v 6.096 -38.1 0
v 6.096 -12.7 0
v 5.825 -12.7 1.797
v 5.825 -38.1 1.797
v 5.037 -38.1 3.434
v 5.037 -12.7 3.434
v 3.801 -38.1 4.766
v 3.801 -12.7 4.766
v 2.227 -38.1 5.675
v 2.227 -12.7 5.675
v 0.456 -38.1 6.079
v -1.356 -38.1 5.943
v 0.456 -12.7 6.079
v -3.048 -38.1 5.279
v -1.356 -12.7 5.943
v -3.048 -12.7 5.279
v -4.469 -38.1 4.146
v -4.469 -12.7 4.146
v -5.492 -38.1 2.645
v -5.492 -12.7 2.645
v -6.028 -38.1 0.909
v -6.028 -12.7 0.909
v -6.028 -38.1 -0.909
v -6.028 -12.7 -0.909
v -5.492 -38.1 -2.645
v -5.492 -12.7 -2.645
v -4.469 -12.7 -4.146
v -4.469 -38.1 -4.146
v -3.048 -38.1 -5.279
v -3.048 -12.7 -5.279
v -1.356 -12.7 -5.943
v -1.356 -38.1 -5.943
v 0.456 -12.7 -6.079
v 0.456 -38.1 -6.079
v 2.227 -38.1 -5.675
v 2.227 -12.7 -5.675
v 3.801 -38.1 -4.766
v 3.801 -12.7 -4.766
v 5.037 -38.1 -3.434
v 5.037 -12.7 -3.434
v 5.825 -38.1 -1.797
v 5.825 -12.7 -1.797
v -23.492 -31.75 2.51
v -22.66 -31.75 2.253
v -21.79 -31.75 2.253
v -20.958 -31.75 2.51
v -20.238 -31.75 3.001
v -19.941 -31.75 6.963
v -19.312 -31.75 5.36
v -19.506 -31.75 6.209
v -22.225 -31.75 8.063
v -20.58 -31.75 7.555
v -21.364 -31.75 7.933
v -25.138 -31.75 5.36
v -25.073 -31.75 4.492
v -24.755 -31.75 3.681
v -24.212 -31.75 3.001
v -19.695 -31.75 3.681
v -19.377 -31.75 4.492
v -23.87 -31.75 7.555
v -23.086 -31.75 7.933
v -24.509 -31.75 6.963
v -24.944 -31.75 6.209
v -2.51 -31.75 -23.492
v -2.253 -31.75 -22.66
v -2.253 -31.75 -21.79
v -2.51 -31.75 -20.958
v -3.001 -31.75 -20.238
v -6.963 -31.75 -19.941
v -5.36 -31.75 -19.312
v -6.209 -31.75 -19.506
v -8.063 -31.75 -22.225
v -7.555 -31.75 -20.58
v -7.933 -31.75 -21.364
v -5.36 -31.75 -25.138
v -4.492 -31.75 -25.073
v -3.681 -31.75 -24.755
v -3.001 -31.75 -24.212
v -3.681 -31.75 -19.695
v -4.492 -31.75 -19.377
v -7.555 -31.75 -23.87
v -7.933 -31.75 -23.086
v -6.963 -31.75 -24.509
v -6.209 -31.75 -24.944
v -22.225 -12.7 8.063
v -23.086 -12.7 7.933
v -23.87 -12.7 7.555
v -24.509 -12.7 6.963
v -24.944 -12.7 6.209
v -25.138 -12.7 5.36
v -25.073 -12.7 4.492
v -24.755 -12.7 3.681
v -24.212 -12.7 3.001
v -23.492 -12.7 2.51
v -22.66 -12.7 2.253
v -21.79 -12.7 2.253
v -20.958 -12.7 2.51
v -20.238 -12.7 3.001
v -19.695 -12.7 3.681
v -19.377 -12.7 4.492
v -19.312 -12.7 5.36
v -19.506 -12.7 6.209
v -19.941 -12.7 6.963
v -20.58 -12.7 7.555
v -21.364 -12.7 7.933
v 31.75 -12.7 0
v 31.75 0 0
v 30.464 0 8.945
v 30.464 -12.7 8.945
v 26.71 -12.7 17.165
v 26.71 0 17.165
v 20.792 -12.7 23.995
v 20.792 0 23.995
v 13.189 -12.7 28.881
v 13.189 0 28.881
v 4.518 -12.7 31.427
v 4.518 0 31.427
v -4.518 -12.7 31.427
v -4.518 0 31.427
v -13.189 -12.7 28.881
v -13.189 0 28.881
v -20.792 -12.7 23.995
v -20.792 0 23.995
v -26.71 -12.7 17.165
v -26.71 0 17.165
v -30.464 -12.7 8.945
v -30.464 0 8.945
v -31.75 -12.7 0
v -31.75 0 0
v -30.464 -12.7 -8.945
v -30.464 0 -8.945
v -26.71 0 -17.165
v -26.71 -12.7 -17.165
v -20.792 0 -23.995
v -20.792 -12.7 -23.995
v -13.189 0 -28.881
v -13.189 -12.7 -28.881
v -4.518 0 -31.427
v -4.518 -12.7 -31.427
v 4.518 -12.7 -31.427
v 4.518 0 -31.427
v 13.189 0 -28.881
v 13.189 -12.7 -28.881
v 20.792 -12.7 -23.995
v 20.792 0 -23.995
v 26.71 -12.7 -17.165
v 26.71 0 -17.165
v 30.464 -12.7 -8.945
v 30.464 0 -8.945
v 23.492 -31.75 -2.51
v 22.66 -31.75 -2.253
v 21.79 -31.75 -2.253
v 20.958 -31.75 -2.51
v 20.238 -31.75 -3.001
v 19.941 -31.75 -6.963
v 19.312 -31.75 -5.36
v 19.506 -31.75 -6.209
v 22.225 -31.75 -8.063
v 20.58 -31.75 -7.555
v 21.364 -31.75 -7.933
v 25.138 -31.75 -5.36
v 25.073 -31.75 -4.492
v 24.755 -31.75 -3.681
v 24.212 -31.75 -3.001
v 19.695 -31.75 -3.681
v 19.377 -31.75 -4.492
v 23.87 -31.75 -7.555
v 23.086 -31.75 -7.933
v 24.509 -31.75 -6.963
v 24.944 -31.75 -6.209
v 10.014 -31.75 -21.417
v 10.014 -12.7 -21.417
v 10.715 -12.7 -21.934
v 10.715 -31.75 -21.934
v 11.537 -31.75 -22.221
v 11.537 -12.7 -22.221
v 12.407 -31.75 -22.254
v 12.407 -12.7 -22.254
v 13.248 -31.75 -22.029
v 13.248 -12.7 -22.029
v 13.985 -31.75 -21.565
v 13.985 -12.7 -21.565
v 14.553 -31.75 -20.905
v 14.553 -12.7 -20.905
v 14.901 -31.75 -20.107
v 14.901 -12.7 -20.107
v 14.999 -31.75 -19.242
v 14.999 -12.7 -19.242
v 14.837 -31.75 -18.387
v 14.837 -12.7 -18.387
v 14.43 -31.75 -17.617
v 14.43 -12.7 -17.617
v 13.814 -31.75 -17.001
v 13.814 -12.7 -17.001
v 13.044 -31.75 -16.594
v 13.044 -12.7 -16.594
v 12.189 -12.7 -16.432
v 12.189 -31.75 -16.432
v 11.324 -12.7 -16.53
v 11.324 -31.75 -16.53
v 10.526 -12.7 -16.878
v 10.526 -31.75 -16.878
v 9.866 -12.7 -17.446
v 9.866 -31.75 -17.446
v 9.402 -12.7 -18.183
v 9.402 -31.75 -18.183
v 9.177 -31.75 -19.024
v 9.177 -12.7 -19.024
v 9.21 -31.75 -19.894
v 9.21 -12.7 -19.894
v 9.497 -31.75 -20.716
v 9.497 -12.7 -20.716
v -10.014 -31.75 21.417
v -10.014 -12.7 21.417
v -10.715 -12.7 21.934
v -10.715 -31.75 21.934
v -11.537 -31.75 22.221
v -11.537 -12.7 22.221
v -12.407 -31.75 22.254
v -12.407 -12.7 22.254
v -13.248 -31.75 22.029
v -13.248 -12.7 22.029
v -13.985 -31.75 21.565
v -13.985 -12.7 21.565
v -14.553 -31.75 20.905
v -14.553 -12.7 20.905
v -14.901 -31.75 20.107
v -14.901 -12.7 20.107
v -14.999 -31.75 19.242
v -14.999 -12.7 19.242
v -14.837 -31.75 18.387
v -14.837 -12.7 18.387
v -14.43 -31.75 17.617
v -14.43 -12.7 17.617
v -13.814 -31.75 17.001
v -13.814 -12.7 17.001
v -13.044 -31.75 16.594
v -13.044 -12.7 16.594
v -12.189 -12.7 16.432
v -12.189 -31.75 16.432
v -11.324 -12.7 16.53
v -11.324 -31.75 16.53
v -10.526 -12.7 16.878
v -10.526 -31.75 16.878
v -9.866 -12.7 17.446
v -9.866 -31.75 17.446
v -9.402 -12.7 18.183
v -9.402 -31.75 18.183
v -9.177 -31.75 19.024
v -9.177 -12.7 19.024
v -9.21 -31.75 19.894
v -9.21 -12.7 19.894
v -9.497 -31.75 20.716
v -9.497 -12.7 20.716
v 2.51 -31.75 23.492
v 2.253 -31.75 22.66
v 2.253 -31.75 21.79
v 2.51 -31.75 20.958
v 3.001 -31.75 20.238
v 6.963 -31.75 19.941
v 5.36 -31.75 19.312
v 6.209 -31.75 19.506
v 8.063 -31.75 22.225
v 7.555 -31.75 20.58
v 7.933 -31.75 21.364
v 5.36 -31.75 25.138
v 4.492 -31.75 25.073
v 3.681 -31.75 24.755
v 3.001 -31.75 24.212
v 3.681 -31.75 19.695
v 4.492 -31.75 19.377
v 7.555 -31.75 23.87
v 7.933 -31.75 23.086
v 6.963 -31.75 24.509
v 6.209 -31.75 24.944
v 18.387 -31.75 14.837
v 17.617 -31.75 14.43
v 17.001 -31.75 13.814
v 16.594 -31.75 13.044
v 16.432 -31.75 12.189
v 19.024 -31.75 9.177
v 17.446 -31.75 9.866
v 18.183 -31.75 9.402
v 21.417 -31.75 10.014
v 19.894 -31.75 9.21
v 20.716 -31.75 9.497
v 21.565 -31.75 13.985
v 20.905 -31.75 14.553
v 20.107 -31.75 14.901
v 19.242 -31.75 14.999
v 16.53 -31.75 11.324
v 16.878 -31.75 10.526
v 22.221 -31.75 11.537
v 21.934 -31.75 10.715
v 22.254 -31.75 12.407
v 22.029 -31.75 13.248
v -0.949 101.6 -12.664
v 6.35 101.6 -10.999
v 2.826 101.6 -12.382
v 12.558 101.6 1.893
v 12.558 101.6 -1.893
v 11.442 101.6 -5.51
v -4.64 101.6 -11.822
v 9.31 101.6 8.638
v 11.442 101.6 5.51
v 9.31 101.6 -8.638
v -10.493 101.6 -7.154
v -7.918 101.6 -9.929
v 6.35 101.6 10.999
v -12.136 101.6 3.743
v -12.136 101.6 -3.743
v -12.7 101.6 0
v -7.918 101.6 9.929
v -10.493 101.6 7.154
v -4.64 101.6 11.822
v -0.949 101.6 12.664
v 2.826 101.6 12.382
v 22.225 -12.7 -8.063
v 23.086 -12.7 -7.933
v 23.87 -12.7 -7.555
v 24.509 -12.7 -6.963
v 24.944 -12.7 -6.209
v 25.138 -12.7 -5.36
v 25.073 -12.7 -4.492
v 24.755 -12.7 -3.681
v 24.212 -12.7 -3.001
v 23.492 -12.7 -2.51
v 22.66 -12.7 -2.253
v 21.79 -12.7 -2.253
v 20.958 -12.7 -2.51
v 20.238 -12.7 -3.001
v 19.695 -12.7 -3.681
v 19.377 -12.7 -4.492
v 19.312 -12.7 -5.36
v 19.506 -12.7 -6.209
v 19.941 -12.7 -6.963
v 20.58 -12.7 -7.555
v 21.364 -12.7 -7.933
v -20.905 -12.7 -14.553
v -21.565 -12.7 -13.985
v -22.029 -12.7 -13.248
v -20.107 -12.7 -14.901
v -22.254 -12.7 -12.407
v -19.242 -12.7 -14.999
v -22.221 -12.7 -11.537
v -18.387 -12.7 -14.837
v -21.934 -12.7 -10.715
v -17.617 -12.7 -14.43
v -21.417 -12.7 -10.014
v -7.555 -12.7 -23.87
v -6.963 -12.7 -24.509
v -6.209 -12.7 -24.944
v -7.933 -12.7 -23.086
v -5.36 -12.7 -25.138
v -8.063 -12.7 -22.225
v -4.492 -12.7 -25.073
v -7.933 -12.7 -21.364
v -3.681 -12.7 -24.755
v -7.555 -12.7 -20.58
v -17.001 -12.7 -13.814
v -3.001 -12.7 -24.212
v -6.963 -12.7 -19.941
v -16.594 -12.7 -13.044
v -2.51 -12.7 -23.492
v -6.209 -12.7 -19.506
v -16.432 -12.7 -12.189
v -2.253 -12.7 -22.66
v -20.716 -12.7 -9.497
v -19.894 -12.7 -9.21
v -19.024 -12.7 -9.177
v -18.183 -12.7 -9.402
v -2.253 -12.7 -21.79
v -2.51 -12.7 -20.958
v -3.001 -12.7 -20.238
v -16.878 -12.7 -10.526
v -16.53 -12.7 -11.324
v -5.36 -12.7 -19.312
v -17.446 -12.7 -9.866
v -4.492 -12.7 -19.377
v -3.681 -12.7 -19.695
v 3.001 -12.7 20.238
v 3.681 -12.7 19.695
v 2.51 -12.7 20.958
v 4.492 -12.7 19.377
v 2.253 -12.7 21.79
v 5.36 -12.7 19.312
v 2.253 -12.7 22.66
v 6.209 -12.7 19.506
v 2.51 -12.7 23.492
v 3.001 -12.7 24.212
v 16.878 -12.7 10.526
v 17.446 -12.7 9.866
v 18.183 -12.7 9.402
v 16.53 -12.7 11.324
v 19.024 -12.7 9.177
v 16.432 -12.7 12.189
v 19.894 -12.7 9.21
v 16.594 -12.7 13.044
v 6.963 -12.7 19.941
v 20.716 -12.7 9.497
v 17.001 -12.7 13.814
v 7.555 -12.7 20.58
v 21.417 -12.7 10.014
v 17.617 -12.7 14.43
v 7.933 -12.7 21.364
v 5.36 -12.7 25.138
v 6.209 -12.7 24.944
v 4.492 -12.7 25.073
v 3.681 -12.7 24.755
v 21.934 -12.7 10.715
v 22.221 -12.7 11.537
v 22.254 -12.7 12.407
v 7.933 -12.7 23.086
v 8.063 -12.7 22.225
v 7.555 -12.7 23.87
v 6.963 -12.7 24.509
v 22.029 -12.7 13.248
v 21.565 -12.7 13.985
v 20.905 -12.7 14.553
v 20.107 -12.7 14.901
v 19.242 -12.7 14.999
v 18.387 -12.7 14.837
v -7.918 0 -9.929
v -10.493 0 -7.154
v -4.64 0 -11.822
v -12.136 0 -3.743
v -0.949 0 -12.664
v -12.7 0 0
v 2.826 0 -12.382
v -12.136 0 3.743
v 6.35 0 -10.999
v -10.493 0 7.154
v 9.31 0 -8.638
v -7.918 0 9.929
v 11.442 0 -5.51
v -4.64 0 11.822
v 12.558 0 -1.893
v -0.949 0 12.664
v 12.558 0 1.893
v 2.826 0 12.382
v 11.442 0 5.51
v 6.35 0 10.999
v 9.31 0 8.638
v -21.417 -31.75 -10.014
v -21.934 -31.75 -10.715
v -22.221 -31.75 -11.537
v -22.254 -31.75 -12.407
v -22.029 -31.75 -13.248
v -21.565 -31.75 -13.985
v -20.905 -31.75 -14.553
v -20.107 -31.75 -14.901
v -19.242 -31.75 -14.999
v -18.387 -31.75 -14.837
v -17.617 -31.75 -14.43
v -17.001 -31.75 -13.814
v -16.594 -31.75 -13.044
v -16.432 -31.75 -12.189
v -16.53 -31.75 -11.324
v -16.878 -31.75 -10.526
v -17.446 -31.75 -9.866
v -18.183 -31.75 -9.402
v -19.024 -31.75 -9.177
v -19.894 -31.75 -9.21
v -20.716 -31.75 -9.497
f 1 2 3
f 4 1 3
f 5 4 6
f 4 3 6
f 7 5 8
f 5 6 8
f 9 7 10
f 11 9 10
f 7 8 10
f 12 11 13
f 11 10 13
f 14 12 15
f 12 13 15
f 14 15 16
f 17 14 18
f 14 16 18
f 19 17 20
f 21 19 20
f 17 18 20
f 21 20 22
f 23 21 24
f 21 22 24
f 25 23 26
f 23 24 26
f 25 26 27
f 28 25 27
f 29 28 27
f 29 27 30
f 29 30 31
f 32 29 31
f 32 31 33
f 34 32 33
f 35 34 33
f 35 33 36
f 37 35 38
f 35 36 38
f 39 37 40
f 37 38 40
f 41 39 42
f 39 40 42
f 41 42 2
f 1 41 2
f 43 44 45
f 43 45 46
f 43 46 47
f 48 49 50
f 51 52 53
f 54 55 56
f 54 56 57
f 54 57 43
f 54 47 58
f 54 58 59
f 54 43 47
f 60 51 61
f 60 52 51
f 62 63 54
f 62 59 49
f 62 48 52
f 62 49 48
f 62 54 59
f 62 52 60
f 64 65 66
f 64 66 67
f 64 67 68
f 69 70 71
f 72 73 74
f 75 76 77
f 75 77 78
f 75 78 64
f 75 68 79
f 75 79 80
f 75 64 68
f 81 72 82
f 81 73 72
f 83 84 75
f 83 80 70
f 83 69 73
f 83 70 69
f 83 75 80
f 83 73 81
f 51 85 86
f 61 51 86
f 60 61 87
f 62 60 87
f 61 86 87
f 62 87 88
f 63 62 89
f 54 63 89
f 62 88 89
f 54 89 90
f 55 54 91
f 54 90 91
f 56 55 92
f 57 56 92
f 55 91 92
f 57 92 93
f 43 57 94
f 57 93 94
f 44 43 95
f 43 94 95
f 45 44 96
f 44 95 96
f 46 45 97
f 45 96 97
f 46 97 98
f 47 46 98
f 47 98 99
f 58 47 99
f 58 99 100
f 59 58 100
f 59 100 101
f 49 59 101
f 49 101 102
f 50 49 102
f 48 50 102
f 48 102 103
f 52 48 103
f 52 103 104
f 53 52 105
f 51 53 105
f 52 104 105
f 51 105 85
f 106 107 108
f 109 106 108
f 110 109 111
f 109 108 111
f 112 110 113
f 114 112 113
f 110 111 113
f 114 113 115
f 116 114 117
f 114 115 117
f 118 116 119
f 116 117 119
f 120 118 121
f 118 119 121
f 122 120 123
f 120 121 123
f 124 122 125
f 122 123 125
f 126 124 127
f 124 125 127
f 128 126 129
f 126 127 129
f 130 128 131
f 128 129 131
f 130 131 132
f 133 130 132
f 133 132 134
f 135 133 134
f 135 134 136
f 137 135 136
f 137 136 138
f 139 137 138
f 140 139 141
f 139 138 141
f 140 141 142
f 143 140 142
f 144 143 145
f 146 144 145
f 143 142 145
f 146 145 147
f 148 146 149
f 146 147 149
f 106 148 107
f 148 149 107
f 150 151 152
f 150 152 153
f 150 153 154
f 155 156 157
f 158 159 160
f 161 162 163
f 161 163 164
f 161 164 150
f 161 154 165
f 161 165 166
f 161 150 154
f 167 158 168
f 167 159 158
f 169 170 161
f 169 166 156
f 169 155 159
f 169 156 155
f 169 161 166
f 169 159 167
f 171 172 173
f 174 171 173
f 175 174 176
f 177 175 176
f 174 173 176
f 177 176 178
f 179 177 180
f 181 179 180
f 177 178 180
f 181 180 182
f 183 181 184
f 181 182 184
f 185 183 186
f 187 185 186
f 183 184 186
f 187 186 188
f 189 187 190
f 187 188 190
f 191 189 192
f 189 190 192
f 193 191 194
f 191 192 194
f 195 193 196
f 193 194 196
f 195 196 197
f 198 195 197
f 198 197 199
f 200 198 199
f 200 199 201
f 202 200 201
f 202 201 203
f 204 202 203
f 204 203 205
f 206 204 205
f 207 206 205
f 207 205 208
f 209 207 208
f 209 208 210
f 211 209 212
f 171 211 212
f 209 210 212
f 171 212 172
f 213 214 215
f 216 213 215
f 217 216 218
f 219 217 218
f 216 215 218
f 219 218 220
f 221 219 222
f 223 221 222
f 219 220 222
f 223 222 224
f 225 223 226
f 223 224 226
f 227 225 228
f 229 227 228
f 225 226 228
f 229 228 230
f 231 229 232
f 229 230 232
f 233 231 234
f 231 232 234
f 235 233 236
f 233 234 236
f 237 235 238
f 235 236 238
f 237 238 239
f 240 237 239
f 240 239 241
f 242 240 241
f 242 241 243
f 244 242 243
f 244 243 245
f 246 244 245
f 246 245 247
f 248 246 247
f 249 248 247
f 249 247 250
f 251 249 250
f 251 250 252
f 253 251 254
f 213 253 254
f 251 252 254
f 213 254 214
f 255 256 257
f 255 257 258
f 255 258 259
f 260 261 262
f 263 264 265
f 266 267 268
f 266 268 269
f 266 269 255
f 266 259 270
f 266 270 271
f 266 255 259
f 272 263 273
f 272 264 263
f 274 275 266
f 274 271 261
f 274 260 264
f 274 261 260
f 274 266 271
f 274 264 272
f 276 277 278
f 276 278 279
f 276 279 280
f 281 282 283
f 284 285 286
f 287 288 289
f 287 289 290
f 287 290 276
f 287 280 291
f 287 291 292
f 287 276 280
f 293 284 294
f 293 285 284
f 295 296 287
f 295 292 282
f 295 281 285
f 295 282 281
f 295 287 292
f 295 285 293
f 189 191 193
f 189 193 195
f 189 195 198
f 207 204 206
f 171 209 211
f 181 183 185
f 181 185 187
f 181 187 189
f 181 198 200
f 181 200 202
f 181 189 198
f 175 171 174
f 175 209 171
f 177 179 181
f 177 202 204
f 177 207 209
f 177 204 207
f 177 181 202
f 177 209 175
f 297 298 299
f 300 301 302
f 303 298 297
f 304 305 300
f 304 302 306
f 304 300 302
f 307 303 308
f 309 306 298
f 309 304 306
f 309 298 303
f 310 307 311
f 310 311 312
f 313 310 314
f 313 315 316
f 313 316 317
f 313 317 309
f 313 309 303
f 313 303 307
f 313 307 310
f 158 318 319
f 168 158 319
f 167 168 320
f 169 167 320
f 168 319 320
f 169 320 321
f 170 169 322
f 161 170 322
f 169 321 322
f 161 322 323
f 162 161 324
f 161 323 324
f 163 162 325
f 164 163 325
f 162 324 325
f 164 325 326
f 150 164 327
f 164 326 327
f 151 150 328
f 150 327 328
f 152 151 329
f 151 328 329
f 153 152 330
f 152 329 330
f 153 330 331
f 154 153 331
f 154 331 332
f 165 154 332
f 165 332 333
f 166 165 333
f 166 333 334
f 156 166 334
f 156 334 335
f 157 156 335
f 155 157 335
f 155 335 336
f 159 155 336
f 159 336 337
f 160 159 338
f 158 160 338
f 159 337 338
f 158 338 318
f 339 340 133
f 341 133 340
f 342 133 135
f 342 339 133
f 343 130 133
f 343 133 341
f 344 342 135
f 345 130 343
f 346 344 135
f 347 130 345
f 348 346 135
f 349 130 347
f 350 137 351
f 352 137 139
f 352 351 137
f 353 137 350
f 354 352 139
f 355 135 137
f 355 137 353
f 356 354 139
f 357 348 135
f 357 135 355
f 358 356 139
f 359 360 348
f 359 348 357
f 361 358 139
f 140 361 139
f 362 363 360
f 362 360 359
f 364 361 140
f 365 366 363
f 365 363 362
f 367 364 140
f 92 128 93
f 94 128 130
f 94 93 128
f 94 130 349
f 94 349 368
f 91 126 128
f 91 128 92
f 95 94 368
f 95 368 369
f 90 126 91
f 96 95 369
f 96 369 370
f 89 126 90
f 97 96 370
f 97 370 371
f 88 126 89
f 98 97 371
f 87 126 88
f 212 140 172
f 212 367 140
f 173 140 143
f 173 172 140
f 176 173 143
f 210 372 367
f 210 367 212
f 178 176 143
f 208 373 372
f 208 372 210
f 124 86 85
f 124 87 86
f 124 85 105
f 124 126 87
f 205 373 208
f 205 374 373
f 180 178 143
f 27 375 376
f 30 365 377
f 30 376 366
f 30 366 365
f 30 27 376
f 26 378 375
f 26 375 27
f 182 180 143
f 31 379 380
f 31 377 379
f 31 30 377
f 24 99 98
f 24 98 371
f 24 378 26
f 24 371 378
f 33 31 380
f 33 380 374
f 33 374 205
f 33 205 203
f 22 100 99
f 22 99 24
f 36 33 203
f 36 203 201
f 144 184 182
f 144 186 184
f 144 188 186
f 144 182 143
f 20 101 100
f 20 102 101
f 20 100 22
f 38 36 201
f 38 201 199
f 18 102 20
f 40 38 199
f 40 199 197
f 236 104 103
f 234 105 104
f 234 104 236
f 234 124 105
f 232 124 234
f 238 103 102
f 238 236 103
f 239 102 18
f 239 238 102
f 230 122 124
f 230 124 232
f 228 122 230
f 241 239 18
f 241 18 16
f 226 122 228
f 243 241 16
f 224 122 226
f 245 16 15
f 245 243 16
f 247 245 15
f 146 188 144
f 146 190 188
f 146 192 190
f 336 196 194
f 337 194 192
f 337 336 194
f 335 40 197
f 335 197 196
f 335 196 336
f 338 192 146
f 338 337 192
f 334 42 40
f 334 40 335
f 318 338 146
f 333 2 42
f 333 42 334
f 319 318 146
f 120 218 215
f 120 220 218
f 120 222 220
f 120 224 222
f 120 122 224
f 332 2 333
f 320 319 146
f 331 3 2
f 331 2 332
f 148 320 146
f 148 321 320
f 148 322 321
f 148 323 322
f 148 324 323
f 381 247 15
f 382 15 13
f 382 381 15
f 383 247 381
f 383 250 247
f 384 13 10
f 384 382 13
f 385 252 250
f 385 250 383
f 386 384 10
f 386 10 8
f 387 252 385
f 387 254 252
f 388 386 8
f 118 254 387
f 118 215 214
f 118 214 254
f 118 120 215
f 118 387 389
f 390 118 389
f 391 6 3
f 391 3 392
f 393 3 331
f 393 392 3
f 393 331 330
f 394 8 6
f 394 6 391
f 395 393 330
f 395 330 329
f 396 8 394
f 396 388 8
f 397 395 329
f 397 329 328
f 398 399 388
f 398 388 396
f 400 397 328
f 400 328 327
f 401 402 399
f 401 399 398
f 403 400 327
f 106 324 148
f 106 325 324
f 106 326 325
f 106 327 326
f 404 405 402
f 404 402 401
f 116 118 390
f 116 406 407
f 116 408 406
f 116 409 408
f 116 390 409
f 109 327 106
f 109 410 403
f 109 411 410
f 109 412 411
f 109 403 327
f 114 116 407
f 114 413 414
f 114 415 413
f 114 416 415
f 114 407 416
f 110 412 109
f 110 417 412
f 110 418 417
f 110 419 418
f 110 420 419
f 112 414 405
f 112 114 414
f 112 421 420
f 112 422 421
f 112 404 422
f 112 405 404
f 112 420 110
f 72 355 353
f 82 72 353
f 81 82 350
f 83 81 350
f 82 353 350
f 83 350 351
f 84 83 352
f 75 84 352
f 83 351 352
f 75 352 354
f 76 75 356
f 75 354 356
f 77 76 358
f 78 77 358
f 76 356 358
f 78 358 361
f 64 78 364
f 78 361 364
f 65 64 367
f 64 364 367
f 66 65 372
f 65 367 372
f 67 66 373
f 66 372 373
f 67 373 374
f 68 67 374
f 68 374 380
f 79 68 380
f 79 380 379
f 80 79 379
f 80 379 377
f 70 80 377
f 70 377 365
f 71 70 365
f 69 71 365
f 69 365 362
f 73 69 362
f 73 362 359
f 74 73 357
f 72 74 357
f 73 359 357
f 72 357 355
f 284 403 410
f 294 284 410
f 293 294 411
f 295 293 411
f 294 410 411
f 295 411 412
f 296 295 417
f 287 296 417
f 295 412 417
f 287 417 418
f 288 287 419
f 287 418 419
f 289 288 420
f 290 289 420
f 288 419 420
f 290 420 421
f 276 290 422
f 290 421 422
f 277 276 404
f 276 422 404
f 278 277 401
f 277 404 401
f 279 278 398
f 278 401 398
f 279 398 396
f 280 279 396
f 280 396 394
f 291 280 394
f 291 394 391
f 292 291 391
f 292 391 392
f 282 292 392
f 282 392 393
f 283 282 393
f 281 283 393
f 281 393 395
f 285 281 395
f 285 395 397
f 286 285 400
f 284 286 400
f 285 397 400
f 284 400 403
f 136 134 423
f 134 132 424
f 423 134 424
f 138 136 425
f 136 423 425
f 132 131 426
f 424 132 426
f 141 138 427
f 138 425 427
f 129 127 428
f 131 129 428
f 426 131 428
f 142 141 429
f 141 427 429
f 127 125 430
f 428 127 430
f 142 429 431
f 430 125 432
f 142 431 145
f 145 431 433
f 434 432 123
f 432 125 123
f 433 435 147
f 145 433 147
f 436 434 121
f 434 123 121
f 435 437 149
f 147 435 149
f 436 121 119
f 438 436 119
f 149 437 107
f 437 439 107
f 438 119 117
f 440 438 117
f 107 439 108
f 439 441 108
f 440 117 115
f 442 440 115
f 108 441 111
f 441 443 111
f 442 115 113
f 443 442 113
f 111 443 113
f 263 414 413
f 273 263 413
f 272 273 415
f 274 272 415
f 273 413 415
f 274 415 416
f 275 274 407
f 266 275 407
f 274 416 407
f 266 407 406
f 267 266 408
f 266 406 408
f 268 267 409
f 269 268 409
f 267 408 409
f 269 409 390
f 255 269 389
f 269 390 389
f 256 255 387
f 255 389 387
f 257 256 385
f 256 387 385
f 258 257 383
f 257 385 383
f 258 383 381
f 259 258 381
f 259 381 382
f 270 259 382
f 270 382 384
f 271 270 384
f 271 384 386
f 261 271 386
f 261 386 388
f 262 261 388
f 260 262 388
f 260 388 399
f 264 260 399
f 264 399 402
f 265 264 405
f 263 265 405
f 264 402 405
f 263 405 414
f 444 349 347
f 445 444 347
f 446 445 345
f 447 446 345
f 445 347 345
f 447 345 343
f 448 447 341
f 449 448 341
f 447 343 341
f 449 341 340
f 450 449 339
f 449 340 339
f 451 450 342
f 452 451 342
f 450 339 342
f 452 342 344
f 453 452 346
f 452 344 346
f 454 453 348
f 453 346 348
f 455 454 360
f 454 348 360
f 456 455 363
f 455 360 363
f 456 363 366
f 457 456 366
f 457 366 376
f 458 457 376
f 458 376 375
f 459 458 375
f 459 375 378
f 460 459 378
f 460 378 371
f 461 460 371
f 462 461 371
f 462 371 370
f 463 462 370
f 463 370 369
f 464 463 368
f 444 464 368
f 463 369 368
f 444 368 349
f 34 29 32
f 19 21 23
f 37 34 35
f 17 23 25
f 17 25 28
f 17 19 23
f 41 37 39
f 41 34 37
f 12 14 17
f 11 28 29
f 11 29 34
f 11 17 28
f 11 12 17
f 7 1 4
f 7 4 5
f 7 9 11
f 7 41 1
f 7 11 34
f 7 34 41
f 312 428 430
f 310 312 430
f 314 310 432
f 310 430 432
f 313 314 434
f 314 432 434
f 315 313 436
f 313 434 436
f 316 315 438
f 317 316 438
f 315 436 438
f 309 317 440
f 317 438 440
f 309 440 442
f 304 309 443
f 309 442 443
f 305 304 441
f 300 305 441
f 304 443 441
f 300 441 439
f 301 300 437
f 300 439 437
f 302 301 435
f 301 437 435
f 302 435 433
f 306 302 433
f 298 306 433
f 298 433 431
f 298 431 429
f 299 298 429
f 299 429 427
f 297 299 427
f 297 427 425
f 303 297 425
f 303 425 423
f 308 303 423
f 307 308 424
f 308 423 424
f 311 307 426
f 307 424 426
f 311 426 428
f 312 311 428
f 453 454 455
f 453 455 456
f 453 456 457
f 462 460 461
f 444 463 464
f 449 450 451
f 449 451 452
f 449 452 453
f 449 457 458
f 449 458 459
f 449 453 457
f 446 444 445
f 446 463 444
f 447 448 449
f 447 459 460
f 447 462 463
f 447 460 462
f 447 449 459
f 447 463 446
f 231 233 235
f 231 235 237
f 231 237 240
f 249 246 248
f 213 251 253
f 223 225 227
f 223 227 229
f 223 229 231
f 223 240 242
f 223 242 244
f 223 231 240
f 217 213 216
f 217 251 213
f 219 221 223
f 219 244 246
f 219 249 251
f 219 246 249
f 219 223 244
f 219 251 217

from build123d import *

# Parameters (mm, degrees)
F0_R            = 31.75
F1_DEPTH        = 12.7
F3_R            = 6.096
F4_DEPTH        = 25.4
F5_R            = 2.921
F6_DEPTH        = 19.05
F6_COPIES_COUNT = 8
F9_R            = 12.7
F10_DEPTH       = 101.6


# Not quite as in the source:
# - a pattern or mirror of a feature is missing from the dataset's text; its kind, count and spacing are read off the source's solid
# - the program builds the solid bodies; features that only make, move or delete a surface that nothing else refers to are left out


with BuildPart() as f1:
    # F0 (on Front) → F1 (new body)
    with BuildSketch(Plane.XZ):
        Circle(F0_R)
    extrude(amount=F1_DEPTH)

    # F3 (on face) → F4 (join)
    with BuildSketch(Plane.XZ.offset(12.7)):
        Circle(F3_R)
    extrude(amount=F4_DEPTH)

    # F5 (on face) → F6 (join)
    with BuildSketch(Plane.XZ.offset(12.7)):
        with Locations((5.1418263465, 22.225)):
            Circle(F5_R)
    f6 = extrude(amount=F6_DEPTH)

    # F6_copies: F6 ×8 about axis
    f6_copies_axis = Axis((0, 0, 0), (0, 1, 0))
    for i in range(1, F6_COPIES_COUNT):
        add(f6.rotate(f6_copies_axis, i * 360 / F6_COPIES_COUNT))

    # F9 (on face) → F10 (join)
    with BuildSketch(Plane(origin=(0, 0, 0), x_dir=(-1, 0, 0), z_dir=(0, 1, 0))):
        Circle(F9_R)
    extrude(amount=F10_DEPTH)


solid = f1.part
